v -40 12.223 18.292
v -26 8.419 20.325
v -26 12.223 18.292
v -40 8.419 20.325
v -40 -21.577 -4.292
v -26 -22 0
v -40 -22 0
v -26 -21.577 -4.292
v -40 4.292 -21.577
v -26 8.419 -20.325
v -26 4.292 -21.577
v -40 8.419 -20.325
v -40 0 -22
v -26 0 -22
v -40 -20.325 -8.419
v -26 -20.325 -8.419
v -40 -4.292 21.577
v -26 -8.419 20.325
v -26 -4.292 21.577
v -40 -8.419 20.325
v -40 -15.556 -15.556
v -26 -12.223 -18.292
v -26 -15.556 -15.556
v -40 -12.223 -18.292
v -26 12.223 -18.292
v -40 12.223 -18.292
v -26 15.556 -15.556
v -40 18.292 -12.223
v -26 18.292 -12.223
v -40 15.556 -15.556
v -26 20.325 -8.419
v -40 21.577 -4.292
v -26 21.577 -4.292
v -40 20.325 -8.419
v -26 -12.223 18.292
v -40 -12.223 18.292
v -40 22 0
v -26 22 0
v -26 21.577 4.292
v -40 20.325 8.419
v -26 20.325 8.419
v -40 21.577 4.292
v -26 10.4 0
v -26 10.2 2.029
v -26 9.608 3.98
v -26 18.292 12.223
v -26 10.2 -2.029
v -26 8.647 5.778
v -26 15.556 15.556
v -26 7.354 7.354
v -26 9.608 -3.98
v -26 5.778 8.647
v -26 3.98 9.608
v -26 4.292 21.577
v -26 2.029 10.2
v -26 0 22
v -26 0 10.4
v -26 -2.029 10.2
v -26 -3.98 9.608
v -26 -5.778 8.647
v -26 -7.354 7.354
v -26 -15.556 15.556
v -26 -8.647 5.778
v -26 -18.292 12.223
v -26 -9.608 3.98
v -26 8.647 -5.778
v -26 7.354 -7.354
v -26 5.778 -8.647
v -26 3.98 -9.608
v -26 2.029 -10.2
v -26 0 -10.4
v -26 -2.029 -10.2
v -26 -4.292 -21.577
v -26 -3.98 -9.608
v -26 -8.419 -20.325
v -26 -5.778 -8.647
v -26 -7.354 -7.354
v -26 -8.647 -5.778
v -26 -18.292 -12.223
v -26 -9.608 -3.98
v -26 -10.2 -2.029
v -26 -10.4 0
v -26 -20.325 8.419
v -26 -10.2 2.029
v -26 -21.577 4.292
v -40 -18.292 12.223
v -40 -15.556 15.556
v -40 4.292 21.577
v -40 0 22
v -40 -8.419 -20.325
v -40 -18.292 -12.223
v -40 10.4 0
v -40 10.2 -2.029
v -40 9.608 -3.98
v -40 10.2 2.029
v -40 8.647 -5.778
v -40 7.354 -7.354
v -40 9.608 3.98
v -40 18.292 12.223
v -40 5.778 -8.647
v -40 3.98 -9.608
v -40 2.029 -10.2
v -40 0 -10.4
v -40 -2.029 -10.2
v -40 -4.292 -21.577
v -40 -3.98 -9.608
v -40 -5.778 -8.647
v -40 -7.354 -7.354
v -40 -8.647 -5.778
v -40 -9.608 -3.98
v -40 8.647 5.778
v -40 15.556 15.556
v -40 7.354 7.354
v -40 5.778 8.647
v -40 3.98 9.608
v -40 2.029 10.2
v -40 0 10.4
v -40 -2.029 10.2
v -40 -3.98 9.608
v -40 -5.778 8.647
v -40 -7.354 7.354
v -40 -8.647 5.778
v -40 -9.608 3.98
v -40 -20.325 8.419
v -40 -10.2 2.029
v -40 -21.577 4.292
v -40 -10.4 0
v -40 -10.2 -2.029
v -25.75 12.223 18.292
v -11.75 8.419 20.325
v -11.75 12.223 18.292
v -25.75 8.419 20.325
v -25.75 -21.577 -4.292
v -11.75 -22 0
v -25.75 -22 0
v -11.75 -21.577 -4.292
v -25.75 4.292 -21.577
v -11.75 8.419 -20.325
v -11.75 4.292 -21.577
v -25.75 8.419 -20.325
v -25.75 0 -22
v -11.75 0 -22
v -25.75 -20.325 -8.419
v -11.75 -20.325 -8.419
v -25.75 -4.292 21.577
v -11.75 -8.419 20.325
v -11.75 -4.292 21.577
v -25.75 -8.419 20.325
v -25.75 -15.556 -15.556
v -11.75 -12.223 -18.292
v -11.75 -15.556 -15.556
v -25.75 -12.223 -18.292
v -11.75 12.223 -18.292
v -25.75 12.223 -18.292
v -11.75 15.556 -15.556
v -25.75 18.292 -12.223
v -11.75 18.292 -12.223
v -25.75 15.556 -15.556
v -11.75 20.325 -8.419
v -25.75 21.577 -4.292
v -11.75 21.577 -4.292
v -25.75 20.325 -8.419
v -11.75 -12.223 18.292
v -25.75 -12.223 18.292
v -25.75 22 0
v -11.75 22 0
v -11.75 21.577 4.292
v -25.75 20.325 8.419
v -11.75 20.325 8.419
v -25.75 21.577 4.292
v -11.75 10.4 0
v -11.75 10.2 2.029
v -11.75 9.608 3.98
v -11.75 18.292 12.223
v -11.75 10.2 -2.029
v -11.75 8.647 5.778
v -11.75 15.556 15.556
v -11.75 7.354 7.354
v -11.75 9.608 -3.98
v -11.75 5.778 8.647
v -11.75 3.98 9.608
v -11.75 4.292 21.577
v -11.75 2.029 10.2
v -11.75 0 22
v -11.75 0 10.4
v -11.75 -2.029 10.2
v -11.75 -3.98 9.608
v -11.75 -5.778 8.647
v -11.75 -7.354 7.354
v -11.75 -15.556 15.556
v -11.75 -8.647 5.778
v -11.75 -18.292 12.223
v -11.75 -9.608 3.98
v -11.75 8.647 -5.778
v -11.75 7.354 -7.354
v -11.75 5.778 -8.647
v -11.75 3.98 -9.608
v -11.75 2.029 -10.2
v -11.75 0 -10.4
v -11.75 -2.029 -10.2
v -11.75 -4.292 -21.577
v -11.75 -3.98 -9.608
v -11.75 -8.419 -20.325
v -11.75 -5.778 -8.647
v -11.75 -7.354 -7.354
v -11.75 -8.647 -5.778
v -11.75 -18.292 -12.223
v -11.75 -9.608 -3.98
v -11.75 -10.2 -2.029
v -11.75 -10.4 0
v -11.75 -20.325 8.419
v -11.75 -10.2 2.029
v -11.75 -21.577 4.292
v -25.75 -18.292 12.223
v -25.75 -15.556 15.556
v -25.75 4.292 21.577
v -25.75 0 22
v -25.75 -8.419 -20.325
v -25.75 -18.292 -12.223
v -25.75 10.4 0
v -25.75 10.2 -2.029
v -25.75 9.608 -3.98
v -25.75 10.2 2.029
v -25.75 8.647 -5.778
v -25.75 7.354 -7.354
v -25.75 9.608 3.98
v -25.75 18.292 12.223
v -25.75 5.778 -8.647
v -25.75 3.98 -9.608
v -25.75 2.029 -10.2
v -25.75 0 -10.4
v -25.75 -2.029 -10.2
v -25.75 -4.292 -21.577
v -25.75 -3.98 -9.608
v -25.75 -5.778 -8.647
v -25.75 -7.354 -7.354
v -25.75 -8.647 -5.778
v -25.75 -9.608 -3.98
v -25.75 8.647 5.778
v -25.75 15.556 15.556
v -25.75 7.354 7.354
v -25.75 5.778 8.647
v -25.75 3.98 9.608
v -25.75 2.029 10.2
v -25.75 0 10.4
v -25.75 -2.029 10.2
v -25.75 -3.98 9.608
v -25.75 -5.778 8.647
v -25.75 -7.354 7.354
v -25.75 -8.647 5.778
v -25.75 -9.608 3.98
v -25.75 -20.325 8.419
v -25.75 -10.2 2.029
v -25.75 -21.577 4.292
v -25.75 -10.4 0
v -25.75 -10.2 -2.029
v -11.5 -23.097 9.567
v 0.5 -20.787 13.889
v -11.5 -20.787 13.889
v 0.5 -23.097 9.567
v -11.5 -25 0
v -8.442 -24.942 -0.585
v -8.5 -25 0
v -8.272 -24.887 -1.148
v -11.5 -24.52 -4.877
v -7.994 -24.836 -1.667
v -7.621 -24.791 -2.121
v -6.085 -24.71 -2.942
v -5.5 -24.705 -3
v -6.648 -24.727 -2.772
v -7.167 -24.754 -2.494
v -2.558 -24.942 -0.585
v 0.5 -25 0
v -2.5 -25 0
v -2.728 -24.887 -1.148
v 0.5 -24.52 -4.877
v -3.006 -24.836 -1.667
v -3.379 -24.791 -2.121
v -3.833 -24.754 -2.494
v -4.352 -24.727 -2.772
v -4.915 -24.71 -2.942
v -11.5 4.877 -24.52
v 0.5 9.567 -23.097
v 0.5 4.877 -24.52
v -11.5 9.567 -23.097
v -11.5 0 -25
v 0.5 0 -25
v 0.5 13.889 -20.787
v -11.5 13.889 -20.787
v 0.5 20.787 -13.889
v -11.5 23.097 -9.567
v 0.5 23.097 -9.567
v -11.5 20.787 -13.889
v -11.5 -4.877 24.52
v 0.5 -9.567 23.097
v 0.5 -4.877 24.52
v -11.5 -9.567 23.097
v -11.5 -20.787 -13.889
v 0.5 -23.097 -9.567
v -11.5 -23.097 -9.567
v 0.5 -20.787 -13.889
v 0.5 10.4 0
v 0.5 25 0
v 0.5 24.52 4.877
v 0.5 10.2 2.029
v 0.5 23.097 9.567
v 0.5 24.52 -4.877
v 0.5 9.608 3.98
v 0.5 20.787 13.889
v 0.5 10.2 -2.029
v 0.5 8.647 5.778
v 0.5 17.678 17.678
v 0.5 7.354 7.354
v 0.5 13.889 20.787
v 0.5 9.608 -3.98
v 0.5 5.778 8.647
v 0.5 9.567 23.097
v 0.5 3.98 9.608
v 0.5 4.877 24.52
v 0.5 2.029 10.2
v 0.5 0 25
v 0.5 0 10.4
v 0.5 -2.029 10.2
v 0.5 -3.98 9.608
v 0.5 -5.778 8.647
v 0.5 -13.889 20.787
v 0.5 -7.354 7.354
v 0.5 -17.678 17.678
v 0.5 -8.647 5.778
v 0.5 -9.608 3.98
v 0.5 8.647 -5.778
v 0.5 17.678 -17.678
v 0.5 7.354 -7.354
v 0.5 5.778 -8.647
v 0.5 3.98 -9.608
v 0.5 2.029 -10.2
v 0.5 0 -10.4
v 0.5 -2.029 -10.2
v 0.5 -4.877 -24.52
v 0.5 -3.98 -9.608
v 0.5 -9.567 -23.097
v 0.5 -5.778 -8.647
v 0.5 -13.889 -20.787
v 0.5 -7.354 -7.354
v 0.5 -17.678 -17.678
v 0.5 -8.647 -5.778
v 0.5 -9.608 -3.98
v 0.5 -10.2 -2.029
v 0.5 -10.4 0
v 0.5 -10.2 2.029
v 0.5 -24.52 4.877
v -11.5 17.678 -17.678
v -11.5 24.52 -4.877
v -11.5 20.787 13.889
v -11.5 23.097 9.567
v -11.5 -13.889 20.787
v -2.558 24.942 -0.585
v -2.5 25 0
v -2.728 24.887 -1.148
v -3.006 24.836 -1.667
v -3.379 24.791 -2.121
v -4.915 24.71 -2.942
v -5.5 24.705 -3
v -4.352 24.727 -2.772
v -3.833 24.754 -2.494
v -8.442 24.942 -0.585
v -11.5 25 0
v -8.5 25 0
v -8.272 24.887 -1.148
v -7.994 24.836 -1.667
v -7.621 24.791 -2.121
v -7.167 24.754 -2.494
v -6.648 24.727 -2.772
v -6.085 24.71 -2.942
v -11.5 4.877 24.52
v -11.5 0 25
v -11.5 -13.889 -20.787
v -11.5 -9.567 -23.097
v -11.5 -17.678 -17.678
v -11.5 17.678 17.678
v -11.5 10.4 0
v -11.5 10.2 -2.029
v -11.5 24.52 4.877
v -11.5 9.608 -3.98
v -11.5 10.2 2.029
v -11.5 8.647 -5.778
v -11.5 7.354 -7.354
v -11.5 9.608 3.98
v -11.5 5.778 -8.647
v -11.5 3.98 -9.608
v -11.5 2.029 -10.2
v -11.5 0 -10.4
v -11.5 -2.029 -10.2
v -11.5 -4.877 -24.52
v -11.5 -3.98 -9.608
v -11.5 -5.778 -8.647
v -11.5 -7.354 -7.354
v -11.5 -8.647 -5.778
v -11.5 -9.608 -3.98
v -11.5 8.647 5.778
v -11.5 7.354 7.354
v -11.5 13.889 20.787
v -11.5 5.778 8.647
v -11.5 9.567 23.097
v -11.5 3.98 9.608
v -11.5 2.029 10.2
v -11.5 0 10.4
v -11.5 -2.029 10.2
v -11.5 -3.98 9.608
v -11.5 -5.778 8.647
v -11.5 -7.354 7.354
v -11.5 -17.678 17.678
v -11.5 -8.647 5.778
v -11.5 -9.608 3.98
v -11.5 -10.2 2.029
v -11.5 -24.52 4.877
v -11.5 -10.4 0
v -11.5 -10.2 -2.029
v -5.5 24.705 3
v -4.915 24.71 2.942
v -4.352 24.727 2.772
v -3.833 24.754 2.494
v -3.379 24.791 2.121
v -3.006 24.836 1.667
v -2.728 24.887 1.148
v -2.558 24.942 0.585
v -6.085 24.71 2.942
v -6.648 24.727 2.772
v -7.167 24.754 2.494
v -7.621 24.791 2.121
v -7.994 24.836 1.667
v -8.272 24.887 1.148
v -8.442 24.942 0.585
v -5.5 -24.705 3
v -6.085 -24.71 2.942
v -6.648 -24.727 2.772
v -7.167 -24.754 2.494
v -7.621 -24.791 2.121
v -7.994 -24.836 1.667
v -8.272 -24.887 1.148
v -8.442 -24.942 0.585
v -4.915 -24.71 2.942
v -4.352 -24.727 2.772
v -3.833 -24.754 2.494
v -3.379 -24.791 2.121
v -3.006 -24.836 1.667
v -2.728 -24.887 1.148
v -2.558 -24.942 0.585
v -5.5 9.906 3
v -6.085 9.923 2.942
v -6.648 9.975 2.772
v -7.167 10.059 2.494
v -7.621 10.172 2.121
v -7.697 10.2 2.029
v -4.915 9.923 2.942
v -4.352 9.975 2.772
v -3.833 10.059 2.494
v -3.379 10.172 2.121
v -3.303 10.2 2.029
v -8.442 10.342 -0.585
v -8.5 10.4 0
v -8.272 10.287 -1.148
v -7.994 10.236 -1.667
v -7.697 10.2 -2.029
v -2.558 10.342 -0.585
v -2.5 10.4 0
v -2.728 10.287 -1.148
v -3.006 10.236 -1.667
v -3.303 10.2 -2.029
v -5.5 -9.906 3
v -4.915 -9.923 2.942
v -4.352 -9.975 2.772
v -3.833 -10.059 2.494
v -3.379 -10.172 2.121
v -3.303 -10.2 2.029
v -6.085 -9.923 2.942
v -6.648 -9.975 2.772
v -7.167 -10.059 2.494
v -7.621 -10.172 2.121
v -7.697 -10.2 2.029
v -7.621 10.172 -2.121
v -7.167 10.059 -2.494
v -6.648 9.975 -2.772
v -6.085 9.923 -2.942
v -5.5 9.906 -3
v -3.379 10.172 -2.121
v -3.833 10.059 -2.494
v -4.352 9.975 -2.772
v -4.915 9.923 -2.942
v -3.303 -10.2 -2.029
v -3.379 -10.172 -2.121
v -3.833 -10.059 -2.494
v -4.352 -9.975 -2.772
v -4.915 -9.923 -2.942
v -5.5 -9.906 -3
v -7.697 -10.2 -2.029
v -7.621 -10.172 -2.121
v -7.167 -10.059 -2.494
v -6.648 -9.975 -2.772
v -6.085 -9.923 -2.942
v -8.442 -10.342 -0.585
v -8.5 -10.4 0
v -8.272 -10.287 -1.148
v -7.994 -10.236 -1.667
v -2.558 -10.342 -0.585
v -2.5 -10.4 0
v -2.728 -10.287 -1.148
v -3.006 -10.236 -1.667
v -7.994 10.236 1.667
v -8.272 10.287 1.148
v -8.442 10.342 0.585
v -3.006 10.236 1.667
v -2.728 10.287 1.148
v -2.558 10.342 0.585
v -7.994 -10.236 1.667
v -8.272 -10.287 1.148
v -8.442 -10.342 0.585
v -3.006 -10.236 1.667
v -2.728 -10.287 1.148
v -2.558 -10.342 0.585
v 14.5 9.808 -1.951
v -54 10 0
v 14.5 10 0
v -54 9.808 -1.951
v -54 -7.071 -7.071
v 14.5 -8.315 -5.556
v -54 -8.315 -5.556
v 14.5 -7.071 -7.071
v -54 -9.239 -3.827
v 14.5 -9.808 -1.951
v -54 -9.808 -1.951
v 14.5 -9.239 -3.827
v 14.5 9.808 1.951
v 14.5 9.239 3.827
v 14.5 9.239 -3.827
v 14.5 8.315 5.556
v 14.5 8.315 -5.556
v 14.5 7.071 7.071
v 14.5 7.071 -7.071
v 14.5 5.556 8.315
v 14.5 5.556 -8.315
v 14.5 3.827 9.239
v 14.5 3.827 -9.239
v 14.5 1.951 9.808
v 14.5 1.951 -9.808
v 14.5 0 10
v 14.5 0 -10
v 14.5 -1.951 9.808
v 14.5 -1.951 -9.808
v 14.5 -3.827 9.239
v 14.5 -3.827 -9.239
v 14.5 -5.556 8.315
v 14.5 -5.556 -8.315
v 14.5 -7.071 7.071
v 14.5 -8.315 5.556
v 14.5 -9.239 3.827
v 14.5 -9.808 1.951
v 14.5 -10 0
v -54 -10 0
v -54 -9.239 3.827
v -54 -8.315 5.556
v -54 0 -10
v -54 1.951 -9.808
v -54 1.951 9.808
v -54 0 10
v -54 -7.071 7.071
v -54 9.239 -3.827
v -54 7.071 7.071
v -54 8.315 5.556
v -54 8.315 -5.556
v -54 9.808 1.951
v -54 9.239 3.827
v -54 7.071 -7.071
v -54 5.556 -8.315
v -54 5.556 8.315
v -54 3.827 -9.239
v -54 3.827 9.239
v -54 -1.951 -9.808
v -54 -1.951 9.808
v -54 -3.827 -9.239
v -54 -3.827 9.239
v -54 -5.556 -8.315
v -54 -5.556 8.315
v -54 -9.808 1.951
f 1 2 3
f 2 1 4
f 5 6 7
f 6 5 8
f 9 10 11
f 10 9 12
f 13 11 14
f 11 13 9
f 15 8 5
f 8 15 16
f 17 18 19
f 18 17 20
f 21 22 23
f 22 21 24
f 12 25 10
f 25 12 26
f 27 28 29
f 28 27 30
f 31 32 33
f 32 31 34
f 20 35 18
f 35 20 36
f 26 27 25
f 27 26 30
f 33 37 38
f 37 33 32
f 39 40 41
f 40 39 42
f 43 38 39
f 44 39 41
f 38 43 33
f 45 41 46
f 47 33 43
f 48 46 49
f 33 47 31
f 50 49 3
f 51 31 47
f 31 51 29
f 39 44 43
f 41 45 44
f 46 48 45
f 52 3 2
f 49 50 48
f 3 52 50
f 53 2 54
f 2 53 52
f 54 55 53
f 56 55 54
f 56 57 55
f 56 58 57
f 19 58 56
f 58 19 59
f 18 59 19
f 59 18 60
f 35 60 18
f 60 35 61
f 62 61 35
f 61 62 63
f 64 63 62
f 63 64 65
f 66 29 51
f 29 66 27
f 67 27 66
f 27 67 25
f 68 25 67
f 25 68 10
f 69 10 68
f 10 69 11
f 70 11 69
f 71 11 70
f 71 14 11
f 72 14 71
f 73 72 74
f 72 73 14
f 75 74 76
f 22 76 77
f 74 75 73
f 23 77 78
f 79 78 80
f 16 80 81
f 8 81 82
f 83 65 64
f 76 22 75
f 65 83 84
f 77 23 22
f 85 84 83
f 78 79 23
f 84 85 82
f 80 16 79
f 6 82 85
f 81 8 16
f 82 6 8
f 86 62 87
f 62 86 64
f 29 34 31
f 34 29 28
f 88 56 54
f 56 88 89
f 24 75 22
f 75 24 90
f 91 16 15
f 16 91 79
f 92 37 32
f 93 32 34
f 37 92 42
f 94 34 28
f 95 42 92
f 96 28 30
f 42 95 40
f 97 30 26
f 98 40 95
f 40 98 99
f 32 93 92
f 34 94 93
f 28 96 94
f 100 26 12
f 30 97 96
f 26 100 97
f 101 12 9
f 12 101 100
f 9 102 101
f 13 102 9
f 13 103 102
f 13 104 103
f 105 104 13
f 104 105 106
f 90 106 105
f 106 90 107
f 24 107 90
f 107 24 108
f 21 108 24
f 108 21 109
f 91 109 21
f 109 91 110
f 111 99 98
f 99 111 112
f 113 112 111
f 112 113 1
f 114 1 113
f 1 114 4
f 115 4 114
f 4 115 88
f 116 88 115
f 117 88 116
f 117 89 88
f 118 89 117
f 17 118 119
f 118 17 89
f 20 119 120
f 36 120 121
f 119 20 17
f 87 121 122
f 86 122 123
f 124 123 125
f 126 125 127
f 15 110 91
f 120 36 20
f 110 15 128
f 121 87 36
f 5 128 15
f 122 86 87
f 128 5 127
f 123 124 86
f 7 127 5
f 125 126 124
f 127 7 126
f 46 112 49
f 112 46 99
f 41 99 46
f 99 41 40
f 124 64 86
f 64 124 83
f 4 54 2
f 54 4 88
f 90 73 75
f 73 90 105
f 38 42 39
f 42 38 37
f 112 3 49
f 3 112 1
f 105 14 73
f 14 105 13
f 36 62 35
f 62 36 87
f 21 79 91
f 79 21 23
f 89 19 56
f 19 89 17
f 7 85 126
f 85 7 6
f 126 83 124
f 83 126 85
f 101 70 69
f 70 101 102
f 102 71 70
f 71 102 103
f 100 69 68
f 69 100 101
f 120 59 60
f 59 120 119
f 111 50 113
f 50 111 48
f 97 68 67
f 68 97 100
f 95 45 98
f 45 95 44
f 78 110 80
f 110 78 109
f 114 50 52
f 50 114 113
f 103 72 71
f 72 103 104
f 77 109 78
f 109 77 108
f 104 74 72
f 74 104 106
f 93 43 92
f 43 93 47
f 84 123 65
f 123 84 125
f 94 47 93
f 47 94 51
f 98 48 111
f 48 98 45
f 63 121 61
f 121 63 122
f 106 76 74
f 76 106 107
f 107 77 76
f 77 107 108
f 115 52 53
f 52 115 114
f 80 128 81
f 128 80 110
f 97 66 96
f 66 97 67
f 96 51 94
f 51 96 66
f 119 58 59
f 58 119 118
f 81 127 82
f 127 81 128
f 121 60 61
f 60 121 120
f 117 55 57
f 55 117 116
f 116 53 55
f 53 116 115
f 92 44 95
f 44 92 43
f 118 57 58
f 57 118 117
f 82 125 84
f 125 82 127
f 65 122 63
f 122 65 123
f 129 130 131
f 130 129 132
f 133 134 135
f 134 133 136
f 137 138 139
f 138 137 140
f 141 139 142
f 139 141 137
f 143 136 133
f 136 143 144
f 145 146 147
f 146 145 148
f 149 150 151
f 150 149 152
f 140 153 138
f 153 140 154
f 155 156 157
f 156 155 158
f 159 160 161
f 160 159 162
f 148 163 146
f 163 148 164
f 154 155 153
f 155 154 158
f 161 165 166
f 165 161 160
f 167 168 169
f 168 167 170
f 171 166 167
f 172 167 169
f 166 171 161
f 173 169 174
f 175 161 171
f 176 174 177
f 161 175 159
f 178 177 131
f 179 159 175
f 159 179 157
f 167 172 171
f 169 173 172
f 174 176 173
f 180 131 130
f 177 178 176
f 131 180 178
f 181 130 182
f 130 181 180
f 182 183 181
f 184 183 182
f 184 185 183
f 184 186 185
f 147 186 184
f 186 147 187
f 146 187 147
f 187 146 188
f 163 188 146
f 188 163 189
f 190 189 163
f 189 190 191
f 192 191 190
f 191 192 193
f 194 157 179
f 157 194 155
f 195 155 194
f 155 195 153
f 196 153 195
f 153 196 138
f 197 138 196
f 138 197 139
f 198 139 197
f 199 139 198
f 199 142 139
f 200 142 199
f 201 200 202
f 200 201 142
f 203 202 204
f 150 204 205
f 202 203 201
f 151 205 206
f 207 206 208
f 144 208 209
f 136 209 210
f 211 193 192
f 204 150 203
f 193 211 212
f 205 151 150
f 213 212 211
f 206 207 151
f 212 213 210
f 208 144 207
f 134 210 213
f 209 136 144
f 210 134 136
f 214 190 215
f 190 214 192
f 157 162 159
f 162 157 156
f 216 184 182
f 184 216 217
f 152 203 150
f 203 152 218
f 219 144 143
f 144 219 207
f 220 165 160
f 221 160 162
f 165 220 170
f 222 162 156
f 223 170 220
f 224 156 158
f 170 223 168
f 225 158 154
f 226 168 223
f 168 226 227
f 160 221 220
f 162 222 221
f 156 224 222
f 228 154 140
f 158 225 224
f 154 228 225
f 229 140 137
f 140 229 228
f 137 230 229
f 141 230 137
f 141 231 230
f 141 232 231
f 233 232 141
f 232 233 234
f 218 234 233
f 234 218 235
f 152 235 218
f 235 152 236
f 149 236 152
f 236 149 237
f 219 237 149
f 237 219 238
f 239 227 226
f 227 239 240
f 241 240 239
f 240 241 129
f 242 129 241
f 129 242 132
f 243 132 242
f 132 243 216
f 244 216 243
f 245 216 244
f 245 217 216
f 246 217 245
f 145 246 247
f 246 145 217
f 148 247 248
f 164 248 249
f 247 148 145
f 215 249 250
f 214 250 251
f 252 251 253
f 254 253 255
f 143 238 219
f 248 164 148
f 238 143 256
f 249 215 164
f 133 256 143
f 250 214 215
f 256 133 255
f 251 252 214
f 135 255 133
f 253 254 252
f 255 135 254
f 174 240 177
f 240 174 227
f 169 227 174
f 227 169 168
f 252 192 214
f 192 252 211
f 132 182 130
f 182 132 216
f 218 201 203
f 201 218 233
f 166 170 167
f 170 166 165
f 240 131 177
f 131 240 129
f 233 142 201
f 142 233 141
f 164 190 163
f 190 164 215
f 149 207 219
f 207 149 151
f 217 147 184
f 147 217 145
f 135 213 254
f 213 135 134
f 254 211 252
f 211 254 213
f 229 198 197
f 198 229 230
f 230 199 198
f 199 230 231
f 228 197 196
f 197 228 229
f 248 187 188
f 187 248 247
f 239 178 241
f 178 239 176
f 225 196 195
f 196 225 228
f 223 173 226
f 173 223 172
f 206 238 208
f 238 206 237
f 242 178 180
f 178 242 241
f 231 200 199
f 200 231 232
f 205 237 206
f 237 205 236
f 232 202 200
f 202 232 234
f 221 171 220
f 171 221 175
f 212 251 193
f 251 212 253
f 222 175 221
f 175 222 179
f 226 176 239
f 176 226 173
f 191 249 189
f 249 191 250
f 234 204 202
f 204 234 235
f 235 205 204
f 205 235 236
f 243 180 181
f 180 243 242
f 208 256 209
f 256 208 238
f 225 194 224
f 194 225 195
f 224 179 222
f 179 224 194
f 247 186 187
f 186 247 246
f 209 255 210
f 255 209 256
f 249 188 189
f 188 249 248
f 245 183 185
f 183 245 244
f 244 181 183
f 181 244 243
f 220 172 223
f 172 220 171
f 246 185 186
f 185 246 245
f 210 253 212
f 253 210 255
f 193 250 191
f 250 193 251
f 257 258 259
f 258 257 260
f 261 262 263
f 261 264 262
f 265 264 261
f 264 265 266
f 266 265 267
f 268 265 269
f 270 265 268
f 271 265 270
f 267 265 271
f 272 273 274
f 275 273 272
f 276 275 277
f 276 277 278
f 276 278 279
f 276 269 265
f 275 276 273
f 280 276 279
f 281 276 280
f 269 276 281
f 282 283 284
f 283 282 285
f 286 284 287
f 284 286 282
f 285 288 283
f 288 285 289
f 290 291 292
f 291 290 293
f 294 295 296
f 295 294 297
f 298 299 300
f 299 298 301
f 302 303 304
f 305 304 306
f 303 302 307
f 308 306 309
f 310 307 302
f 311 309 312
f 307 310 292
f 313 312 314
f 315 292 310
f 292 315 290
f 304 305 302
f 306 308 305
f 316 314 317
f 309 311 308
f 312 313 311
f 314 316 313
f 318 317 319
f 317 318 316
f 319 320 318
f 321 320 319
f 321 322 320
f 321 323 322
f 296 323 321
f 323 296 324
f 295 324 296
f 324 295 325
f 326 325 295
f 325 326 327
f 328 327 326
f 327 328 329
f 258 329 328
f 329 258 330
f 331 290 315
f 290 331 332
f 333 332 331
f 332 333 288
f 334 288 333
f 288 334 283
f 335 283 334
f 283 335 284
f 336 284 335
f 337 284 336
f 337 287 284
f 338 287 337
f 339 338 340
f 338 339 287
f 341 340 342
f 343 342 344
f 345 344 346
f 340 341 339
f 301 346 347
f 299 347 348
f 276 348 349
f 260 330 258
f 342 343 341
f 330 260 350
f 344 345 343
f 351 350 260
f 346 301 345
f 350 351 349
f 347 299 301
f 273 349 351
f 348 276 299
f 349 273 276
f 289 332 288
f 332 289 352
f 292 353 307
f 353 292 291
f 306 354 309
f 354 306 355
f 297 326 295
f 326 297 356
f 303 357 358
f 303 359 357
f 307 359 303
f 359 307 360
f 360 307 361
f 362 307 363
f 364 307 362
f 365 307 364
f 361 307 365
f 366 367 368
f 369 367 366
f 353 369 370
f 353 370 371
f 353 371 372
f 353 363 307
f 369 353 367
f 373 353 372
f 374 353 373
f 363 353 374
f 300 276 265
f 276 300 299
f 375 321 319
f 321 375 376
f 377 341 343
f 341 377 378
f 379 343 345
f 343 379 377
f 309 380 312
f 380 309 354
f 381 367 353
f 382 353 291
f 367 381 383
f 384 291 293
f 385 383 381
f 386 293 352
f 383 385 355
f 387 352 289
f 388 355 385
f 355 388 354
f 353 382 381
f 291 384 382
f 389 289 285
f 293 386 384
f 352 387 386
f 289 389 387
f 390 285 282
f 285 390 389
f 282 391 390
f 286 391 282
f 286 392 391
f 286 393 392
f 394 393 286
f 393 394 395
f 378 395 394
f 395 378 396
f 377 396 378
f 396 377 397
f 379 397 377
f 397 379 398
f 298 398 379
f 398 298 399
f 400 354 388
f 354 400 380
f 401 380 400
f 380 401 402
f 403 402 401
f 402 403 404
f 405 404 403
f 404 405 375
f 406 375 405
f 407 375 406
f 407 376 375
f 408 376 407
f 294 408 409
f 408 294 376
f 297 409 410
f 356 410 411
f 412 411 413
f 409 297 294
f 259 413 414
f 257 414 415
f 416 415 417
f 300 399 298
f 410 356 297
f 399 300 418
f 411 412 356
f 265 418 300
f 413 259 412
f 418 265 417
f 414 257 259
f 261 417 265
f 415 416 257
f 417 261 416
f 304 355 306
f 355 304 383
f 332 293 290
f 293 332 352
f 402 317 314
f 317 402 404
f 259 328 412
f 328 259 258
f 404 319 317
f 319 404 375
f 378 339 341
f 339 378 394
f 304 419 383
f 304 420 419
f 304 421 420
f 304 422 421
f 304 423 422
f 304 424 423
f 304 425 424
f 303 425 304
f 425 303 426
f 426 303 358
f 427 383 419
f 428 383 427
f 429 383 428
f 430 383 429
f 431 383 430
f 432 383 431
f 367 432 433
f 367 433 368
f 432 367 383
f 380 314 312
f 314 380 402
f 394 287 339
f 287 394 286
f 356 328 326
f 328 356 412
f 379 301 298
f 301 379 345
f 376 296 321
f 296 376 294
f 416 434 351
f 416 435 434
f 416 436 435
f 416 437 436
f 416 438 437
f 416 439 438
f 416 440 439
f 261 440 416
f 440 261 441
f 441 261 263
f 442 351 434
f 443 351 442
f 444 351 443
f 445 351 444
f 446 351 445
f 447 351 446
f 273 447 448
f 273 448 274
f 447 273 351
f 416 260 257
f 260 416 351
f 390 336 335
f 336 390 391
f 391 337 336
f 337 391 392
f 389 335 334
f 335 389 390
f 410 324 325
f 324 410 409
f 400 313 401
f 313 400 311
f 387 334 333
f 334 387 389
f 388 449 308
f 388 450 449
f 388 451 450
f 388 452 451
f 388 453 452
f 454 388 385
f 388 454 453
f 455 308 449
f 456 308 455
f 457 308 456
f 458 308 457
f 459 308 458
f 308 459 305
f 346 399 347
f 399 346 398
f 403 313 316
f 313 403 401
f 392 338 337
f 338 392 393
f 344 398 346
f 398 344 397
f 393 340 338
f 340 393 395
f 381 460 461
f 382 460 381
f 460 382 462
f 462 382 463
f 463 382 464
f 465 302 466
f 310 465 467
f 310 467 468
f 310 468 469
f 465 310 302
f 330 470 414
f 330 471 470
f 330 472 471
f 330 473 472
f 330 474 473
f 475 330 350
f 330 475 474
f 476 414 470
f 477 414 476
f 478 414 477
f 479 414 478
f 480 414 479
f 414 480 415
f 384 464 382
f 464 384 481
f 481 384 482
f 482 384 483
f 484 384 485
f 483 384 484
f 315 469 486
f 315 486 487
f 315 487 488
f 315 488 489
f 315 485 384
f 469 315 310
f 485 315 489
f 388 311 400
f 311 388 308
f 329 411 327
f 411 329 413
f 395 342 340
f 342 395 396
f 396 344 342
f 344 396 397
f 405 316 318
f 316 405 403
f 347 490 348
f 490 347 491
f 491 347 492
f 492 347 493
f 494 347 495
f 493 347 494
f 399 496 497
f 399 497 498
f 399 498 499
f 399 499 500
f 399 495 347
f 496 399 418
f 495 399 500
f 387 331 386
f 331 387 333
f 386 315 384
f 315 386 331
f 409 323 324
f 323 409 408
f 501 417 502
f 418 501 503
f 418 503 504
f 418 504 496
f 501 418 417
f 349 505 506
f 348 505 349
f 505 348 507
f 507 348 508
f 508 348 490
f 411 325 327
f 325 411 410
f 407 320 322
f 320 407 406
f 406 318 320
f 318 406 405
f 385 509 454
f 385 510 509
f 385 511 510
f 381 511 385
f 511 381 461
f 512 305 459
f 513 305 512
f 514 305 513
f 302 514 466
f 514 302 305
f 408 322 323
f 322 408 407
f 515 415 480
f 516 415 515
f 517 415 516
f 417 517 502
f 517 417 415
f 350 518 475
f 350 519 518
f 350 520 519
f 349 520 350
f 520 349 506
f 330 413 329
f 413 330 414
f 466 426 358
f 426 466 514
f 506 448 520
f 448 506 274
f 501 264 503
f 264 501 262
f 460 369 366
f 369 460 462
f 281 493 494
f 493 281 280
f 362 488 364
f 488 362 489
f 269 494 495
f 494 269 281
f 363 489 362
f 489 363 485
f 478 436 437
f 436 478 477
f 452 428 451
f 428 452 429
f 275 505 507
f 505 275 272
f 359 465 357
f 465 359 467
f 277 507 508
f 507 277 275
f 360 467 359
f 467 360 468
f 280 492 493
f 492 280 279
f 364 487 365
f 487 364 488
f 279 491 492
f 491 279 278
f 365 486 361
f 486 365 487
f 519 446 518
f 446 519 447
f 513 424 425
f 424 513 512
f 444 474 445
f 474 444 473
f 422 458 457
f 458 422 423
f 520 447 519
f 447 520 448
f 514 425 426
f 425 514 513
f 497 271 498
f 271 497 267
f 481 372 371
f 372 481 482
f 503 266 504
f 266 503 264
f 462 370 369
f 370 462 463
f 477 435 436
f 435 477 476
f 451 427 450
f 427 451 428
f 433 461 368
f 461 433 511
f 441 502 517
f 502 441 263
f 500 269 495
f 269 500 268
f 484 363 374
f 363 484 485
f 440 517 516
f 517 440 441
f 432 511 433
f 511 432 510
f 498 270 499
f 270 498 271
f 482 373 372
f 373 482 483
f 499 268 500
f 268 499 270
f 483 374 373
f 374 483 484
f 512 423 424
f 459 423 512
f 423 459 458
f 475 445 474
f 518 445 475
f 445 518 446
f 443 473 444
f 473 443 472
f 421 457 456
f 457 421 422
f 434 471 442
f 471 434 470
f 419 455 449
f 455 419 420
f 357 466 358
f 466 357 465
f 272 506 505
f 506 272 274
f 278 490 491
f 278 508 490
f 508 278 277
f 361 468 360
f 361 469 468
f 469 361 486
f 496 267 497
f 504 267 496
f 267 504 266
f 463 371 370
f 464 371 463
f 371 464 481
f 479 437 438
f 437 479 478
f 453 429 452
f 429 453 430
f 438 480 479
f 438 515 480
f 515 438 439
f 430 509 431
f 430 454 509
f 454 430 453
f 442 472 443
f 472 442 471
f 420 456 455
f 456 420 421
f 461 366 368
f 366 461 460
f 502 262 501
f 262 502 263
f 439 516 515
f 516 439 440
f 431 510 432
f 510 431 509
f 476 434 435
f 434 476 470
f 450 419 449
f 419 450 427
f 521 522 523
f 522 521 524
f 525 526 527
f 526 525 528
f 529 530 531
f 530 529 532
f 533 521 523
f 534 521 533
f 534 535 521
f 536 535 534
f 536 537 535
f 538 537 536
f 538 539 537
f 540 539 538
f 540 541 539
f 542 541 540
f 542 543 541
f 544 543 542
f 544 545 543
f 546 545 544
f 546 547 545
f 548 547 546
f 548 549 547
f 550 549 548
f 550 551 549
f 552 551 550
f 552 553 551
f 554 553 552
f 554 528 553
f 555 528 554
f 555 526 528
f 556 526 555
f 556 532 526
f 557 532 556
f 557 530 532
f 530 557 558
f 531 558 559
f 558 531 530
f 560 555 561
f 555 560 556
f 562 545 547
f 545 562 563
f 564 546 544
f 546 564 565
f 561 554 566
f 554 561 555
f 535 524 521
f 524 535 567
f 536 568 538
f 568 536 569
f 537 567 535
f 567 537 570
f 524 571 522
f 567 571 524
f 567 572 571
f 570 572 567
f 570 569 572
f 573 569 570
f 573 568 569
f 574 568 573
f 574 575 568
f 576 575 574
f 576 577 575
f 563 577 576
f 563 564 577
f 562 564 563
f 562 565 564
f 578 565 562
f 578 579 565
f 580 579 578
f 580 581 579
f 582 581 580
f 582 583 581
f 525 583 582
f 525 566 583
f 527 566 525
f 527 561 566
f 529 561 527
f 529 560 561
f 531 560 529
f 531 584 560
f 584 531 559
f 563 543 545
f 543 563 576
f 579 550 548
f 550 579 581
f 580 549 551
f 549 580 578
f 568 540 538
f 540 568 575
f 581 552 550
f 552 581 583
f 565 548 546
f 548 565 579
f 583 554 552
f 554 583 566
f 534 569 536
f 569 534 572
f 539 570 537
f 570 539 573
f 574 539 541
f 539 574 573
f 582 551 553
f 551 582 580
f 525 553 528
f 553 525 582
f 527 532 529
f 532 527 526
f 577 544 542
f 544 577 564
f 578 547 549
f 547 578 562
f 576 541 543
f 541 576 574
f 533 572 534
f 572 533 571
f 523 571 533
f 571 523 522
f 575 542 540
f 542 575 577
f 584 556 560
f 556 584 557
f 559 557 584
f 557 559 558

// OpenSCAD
$fn = 32;

// ------------------------------------------------------------------------
// Shaft with rings and collars: d20 shaft, 3 rings
// Every part is its own module, assembly() places them once.
// ------------------------------------------------------------------------

// --- part 1 ---
module shaft() {
  translate([0, 0, -34.25]) cylinder(h = 68.5, d = 20);
}

// --- part 2 ---
module spacer_a() {
  difference() {
      translate([0, 0, 0]) cylinder(h = 14, d = 44);
      translate([0, 0, -1]) cylinder(h = 16, d = 20.8);
    }
}

// --- part 3 ---
module spacer_b() {
  difference() {
      translate([0, 0, 0]) cylinder(h = 14, d = 44);
      translate([0, 0, -1]) cylinder(h = 16, d = 20.8);
    }
}

// --- part 4 ---
module collar_a() {
  difference() {
    cylinder(h = 12, d = 50);
    translate([0, 0, -1]) cylinder(h = 14, d = 20.8);
    translate([0, 0, 6]) rotate([90, 0, 0]) cylinder(h = 52, d = 6, center = true);
  }
}

// --- assembly ---
module assembly() {
  translate([-19.75, 0, 0]) rotate([0, 90, 0]) shaft();
  translate([-40, 0, 0]) rotate([0, 90, 0]) spacer_a();
  translate([-25.75, 0, 0]) rotate([0, 90, 0]) spacer_b();
  translate([-11.5, 0, 0]) rotate([0, 90, 0]) collar_a();
}

assembly();
